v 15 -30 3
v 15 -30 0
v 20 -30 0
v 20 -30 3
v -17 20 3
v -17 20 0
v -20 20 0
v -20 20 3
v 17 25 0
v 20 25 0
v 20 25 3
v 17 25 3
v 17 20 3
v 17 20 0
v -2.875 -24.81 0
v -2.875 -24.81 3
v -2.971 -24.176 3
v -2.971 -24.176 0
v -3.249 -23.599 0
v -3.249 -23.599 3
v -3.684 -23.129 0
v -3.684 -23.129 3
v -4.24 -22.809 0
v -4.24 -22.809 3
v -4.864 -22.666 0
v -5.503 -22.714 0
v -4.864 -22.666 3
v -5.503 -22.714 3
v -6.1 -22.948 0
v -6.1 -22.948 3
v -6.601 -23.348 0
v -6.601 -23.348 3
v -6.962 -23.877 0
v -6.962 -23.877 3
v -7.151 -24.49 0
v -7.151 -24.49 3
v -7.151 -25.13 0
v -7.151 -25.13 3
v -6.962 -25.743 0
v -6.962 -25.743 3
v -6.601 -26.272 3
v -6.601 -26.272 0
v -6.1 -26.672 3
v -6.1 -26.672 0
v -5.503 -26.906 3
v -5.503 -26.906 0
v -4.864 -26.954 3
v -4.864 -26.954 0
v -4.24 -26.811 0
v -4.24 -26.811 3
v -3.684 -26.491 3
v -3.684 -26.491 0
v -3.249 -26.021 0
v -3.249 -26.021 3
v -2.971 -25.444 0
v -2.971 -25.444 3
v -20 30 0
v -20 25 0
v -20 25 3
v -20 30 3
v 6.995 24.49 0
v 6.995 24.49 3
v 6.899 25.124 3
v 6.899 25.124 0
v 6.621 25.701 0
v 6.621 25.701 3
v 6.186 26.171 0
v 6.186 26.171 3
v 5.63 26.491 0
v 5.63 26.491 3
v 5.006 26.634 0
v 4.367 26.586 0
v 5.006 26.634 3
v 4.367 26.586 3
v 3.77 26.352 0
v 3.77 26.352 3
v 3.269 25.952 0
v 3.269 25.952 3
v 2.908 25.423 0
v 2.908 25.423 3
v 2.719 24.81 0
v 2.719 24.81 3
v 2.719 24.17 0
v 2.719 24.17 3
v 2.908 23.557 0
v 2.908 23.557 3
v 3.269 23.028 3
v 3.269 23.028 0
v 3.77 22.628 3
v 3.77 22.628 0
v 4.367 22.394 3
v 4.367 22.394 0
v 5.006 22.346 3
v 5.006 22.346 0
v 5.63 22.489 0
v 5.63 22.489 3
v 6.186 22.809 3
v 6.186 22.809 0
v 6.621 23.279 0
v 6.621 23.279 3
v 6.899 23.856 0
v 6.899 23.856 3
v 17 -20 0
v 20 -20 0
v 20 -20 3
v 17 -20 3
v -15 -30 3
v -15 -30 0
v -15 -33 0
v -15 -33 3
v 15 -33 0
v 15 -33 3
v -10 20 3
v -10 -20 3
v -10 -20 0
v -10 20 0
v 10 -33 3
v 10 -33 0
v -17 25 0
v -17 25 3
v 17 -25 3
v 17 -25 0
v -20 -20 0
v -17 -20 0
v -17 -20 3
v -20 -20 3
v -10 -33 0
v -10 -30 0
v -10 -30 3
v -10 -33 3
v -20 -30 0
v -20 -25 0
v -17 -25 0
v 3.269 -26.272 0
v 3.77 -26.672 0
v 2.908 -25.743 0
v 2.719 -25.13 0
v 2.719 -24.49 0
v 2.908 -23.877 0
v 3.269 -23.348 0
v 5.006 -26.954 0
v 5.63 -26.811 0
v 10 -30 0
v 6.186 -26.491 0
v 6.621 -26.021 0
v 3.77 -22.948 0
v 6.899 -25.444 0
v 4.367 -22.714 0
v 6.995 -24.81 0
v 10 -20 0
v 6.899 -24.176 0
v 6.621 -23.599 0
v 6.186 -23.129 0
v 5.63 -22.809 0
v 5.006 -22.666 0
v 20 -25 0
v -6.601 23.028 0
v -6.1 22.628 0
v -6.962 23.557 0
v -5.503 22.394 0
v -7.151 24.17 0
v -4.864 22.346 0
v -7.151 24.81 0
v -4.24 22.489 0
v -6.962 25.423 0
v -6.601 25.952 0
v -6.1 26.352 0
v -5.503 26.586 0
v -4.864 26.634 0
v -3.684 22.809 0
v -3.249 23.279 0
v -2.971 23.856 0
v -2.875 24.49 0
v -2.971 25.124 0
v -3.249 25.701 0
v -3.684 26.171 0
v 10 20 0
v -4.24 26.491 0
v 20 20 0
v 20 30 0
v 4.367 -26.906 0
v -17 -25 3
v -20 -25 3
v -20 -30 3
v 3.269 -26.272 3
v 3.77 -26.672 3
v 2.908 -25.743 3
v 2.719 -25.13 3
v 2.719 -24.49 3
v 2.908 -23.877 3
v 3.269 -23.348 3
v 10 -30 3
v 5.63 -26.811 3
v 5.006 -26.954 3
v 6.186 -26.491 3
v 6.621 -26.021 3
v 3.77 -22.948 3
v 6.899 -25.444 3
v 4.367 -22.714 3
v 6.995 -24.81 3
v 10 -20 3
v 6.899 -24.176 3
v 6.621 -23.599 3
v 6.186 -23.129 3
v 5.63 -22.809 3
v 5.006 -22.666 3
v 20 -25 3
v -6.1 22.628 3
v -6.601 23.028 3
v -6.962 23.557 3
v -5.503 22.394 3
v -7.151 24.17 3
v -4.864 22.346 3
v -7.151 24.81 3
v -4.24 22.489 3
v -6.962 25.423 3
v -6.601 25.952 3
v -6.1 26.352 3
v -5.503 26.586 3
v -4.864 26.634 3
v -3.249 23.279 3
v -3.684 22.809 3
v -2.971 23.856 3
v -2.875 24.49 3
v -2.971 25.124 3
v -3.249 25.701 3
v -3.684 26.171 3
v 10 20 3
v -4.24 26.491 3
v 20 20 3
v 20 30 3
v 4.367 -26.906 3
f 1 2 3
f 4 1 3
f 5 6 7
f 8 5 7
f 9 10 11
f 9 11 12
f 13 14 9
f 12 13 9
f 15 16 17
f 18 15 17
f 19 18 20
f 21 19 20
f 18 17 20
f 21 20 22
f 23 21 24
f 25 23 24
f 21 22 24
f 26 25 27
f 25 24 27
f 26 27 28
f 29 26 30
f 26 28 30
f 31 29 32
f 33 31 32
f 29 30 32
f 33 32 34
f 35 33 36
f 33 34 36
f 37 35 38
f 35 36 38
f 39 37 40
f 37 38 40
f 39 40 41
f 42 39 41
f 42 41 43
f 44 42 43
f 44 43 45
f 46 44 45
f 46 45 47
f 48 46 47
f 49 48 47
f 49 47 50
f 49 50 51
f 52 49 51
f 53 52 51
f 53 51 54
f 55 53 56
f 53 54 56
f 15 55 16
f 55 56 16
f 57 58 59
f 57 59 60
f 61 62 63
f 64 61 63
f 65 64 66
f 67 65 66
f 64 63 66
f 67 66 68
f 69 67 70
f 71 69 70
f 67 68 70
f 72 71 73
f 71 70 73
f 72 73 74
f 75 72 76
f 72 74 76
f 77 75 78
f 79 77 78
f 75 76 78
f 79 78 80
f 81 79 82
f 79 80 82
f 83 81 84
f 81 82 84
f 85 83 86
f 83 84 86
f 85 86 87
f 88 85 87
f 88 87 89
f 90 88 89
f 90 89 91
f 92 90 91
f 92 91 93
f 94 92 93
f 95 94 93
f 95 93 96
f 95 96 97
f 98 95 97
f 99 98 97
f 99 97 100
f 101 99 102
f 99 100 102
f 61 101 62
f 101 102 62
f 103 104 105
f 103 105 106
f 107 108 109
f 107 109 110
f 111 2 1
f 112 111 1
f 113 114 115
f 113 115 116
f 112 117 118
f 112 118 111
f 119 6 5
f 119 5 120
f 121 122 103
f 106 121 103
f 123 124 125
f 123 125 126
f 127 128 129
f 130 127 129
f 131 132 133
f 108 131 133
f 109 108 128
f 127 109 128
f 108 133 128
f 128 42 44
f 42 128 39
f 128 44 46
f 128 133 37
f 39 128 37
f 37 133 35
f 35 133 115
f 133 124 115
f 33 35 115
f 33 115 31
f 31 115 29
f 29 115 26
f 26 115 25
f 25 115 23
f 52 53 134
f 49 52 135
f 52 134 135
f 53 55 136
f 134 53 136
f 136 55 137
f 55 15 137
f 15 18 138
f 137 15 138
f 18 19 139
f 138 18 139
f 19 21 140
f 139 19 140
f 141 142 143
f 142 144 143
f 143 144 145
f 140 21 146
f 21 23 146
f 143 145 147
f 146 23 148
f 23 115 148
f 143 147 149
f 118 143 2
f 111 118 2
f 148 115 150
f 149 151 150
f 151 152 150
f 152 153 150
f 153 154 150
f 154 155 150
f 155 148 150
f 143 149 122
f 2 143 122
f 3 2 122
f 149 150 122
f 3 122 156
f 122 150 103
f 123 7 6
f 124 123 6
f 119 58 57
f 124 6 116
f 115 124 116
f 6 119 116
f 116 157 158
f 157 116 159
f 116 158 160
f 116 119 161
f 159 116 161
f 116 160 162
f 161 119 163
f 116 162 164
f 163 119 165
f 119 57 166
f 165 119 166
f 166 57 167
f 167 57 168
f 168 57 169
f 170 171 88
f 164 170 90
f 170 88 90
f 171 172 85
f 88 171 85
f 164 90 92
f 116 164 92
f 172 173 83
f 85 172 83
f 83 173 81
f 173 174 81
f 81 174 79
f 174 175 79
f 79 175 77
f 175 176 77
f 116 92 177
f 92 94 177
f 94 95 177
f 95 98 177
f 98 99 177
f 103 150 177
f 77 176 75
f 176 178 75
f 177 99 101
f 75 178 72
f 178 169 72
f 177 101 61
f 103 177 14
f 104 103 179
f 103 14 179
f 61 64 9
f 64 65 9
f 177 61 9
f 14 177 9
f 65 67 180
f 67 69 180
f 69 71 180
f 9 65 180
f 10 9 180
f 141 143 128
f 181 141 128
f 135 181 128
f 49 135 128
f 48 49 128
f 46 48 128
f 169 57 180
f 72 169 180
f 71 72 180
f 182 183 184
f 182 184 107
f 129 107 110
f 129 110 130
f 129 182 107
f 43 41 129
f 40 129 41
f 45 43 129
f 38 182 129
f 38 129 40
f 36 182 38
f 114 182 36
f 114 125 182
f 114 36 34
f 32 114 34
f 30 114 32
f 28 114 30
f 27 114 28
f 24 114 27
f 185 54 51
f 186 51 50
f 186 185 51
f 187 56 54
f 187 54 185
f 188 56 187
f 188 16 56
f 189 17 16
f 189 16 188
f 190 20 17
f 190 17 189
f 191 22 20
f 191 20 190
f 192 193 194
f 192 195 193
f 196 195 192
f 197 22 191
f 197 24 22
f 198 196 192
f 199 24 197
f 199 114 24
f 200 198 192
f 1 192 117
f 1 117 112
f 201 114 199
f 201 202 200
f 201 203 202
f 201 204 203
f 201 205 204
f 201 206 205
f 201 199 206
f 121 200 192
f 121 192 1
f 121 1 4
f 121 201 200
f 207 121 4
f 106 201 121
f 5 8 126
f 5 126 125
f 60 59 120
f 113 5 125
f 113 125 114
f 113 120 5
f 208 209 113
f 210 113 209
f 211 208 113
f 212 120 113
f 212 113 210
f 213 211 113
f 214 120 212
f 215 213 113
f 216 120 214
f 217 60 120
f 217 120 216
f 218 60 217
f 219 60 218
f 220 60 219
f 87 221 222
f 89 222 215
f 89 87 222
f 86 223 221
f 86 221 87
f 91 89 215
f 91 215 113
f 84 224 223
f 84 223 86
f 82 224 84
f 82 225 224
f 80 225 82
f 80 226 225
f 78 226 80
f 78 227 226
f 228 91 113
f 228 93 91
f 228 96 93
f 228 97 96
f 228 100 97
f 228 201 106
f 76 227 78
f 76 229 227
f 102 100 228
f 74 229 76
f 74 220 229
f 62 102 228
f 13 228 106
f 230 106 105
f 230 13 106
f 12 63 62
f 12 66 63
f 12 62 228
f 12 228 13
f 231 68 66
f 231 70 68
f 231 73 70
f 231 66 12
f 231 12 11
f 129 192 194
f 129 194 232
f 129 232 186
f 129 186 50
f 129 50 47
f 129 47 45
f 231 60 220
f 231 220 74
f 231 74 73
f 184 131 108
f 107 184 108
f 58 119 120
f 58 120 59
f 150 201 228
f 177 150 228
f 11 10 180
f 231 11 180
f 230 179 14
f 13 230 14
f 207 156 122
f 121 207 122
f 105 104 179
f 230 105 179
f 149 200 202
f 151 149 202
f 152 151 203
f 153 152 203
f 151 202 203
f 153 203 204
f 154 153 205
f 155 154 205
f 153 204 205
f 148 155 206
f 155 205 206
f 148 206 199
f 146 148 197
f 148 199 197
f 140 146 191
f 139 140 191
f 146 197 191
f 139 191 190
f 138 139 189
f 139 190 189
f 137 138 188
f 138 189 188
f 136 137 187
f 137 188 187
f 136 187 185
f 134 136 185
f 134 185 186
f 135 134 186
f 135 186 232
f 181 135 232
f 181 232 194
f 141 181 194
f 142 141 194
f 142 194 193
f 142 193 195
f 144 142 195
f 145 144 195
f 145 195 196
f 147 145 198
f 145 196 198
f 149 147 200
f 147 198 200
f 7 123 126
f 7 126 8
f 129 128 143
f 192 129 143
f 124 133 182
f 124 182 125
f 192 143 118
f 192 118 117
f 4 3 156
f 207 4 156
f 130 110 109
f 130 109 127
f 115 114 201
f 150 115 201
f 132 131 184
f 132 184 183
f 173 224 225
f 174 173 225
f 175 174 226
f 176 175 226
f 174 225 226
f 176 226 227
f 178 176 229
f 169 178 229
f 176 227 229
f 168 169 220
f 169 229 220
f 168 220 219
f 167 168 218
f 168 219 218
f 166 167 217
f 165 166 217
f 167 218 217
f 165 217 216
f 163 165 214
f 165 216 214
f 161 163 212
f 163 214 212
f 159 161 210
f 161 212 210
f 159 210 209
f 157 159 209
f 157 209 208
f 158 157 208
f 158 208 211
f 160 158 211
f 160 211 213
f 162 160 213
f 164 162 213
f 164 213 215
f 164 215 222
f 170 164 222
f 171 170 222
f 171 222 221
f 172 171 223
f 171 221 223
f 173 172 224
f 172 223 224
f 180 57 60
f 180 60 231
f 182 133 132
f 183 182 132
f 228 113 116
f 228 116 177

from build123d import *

# Parameters (mm, degrees)
SKETCH1_W           = 40
SKETCH1_H           = 60
BOSS_EXTRUDE1_DEPTH = 3
SKETCH2_R           = 2.15
SKETCH2_W           = 20
SKETCH2_H           = 40
CUT_EXTRUDE1_DEPTH  = 3
SKETCH3_W           = 5
SKETCH3_H           = 3
BOSS_EXTRUDE2_DEPTH = 3
SKETCH4_W           = 3
SKETCH4_H           = 5
CUT_EXTRUDE2_DEPTH  = 3


with BuildPart() as part:
    # Sketch1 → Boss-Extrude1 (new body)
    with BuildSketch(Plane.XY):
        Rectangle(SKETCH1_W, SKETCH1_H)
    extrude(amount=BOSS_EXTRUDE1_DEPTH)

    # Sketch2 → Cut-Extrude1 (cut)
    with BuildSketch(Plane.XY.offset(3)):
        with Locations((4.845, 24.49)):
            Circle(SKETCH2_R)
        with Locations((-5.025, 24.49)):
            Circle(SKETCH2_R)
        with Locations((-5.025, -24.81)):
            Circle(SKETCH2_R)
        with Locations((4.845, -24.81)):
            Circle(SKETCH2_R)
        Rectangle(SKETCH2_W, SKETCH2_H)
    extrude(amount=-CUT_EXTRUDE1_DEPTH, mode=Mode.SUBTRACT)

    # Sketch3 → Boss-Extrude2 (add)
    with BuildSketch(Plane.XZ.offset(30)):
        with Locations((12.5, 1.5)):
            Rectangle(SKETCH3_W, SKETCH3_H)
        with Locations((-12.5, 1.5)):
            Rectangle(SKETCH3_W, SKETCH3_H)
    extrude(amount=BOSS_EXTRUDE2_DEPTH)

    # Sketch4 → Cut-Extrude2 (cut)
    with BuildSketch(Plane(origin=(0, 0, 0), x_dir=(-1, 0, 0), z_dir=(0, 0, -1))):
        with Locations((-18.5, -22.5)):
            Rectangle(SKETCH4_W, SKETCH4_H)
        with Locations((-18.5, 22.5)):
            Rectangle(SKETCH4_W, SKETCH4_H)
        with Locations((18.5, 22.5)):
            Rectangle(SKETCH4_W, SKETCH4_H)
        with Locations((18.5, -22.5)):
            Rectangle(SKETCH4_W, SKETCH4_H)
    extrude(amount=-CUT_EXTRUDE2_DEPTH, mode=Mode.SUBTRACT)


solid = part.part
